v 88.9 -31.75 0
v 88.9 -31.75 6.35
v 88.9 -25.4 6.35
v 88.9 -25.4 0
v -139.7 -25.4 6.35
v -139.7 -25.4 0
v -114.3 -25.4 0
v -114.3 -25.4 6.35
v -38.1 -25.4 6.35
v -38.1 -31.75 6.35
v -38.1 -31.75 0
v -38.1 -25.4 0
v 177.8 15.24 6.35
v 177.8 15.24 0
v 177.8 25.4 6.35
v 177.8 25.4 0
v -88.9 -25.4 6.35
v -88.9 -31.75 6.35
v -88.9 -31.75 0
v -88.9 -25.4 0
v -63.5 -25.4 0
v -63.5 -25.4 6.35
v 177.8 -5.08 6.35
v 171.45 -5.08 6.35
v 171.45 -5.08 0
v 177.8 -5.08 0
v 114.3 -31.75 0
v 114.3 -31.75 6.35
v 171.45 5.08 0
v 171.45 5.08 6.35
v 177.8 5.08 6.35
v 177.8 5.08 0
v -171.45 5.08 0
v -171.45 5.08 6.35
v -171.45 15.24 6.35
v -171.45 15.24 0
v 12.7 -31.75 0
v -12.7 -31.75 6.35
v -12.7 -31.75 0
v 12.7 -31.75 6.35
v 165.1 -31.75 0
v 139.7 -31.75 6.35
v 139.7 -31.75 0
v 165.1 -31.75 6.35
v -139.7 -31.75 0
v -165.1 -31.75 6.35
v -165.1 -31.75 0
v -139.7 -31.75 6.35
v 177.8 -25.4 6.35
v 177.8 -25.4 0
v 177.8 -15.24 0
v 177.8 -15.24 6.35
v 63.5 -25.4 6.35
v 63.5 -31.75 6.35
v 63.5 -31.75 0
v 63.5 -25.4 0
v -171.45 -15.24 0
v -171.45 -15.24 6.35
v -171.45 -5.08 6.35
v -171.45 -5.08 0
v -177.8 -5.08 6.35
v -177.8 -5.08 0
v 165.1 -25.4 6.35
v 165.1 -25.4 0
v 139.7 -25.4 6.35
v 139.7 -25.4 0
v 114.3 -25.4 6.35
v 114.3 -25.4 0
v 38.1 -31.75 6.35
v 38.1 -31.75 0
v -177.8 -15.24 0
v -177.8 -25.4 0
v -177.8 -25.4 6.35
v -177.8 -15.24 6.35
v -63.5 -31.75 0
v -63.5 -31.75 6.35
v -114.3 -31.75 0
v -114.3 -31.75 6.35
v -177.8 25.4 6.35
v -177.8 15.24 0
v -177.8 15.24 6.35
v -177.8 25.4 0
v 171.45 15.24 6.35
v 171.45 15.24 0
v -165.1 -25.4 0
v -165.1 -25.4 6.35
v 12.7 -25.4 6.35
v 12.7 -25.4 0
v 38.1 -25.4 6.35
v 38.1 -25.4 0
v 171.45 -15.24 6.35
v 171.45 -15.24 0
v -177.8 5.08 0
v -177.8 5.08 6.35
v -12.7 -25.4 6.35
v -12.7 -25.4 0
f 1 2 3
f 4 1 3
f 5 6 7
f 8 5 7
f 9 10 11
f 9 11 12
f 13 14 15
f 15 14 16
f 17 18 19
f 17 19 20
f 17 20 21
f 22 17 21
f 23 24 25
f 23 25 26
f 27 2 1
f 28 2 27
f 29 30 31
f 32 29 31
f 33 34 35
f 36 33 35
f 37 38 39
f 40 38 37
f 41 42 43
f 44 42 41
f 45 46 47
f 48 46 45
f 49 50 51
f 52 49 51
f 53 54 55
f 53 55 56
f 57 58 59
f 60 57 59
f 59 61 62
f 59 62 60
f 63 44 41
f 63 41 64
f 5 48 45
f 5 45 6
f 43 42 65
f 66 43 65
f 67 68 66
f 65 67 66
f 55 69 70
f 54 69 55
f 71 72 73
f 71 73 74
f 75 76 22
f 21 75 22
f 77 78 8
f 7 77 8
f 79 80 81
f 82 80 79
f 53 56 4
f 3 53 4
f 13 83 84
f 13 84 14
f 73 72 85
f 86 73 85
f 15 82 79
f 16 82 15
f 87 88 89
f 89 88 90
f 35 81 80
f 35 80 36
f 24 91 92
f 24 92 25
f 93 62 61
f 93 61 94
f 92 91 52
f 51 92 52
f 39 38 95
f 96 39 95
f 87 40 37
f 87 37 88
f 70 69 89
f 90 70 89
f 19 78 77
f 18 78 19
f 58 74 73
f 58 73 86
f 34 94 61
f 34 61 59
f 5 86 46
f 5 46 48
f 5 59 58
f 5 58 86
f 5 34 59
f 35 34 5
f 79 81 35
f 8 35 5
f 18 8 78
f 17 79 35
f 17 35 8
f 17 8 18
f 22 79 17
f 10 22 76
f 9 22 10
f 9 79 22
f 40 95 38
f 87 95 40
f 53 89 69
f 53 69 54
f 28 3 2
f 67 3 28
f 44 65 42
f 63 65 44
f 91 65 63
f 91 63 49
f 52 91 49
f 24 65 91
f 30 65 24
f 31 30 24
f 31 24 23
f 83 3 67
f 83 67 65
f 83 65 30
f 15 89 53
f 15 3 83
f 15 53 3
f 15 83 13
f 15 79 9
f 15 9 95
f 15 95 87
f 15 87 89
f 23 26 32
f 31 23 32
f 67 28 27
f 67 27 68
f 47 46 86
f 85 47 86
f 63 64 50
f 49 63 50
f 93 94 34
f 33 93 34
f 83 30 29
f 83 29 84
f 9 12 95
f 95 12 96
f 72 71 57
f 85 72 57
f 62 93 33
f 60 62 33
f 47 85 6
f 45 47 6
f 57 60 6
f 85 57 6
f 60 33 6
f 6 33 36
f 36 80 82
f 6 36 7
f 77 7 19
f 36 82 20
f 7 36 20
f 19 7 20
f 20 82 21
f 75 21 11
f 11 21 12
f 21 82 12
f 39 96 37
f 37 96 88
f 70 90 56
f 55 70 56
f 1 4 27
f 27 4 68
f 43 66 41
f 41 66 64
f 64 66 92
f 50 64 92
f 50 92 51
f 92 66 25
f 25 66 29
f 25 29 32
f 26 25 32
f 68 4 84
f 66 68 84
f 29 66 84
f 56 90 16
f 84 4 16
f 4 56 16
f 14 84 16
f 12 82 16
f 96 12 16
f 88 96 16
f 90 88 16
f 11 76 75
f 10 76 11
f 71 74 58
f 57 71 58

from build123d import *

# Parameters (mm, degrees)
ESQUISSE1_W                     = 355.6
ESQUISSE1_H                     = 50.8
BOSS_EXTRU_1_DEPTH              = 6.35
ESQUISSE2_W                     = 6.35
ESQUISSE2_H                     = 10.16
ENL_V_MAT_EXTRU_1_DEPTH         = 180.717340566
R_P_TITION_LIN_AIRE1_COUNT      = 2
R_P_TITION_LIN_AIRE1_PITCH      = 20.32
R_P_TITION_LIN_AIRE1_COUNT_DIR2 = 2
R_P_TITION_LIN_AIRE1_PITCH_DIR2 = 349.25
ESQUISSE3_W                     = 25.4
ESQUISSE3_H                     = 6.35
BOSS_EXTRU_2_DEPTH              = 6.35
R_P_TITION_LIN_AIRE2_COUNT      = 7
R_P_TITION_LIN_AIRE2_PITCH      = 50.8


with BuildPart() as part:
    # Esquisse1 → Boss.-Extru.1 (new body)
    with BuildSketch(Plane.XY):
        Rectangle(ESQUISSE1_W, ESQUISSE1_H)
    extrude(amount=BOSS_EXTRU_1_DEPTH)

    # Esquisse2 → Enlèv. mat.-Extru.1 (cut, through all)
    with BuildSketch(Plane.XY.offset(6.35)):
        with Locations((-174.625, -10.16)):
            Rectangle(ESQUISSE2_W, ESQUISSE2_H)
    enl_v_mat_extru_1 = extrude(amount=-ENL_V_MAT_EXTRU_1_DEPTH, mode=Mode.SUBTRACT)

    # Répétition linéaire1: Enl_v. mat.-Extru.1 2 × 2
    with Locations(*[(j * R_P_TITION_LIN_AIRE1_PITCH_DIR2, i * R_P_TITION_LIN_AIRE1_PITCH, 0) for i in range(R_P_TITION_LIN_AIRE1_COUNT) for j in range(R_P_TITION_LIN_AIRE1_COUNT_DIR2) if (i, j) != (0, 0)]):
        add(enl_v_mat_extru_1, mode=Mode.SUBTRACT)

    # Esquisse3 → Boss.-Extru.2 (add)
    with BuildSketch(Plane.XY.offset(6.35)):
        with Locations((-152.4, -28.575)):
            Rectangle(ESQUISSE3_W, ESQUISSE3_H)
    boss_extru_2 = extrude(amount=-BOSS_EXTRU_2_DEPTH)

    # Répétition linéaire2: Boss.-Extru.2 ×7
    with Locations(*[(i * R_P_TITION_LIN_AIRE2_PITCH, 0, 0) for i in range(1, R_P_TITION_LIN_AIRE2_COUNT)]):
        add(boss_extru_2)


solid = part.part
